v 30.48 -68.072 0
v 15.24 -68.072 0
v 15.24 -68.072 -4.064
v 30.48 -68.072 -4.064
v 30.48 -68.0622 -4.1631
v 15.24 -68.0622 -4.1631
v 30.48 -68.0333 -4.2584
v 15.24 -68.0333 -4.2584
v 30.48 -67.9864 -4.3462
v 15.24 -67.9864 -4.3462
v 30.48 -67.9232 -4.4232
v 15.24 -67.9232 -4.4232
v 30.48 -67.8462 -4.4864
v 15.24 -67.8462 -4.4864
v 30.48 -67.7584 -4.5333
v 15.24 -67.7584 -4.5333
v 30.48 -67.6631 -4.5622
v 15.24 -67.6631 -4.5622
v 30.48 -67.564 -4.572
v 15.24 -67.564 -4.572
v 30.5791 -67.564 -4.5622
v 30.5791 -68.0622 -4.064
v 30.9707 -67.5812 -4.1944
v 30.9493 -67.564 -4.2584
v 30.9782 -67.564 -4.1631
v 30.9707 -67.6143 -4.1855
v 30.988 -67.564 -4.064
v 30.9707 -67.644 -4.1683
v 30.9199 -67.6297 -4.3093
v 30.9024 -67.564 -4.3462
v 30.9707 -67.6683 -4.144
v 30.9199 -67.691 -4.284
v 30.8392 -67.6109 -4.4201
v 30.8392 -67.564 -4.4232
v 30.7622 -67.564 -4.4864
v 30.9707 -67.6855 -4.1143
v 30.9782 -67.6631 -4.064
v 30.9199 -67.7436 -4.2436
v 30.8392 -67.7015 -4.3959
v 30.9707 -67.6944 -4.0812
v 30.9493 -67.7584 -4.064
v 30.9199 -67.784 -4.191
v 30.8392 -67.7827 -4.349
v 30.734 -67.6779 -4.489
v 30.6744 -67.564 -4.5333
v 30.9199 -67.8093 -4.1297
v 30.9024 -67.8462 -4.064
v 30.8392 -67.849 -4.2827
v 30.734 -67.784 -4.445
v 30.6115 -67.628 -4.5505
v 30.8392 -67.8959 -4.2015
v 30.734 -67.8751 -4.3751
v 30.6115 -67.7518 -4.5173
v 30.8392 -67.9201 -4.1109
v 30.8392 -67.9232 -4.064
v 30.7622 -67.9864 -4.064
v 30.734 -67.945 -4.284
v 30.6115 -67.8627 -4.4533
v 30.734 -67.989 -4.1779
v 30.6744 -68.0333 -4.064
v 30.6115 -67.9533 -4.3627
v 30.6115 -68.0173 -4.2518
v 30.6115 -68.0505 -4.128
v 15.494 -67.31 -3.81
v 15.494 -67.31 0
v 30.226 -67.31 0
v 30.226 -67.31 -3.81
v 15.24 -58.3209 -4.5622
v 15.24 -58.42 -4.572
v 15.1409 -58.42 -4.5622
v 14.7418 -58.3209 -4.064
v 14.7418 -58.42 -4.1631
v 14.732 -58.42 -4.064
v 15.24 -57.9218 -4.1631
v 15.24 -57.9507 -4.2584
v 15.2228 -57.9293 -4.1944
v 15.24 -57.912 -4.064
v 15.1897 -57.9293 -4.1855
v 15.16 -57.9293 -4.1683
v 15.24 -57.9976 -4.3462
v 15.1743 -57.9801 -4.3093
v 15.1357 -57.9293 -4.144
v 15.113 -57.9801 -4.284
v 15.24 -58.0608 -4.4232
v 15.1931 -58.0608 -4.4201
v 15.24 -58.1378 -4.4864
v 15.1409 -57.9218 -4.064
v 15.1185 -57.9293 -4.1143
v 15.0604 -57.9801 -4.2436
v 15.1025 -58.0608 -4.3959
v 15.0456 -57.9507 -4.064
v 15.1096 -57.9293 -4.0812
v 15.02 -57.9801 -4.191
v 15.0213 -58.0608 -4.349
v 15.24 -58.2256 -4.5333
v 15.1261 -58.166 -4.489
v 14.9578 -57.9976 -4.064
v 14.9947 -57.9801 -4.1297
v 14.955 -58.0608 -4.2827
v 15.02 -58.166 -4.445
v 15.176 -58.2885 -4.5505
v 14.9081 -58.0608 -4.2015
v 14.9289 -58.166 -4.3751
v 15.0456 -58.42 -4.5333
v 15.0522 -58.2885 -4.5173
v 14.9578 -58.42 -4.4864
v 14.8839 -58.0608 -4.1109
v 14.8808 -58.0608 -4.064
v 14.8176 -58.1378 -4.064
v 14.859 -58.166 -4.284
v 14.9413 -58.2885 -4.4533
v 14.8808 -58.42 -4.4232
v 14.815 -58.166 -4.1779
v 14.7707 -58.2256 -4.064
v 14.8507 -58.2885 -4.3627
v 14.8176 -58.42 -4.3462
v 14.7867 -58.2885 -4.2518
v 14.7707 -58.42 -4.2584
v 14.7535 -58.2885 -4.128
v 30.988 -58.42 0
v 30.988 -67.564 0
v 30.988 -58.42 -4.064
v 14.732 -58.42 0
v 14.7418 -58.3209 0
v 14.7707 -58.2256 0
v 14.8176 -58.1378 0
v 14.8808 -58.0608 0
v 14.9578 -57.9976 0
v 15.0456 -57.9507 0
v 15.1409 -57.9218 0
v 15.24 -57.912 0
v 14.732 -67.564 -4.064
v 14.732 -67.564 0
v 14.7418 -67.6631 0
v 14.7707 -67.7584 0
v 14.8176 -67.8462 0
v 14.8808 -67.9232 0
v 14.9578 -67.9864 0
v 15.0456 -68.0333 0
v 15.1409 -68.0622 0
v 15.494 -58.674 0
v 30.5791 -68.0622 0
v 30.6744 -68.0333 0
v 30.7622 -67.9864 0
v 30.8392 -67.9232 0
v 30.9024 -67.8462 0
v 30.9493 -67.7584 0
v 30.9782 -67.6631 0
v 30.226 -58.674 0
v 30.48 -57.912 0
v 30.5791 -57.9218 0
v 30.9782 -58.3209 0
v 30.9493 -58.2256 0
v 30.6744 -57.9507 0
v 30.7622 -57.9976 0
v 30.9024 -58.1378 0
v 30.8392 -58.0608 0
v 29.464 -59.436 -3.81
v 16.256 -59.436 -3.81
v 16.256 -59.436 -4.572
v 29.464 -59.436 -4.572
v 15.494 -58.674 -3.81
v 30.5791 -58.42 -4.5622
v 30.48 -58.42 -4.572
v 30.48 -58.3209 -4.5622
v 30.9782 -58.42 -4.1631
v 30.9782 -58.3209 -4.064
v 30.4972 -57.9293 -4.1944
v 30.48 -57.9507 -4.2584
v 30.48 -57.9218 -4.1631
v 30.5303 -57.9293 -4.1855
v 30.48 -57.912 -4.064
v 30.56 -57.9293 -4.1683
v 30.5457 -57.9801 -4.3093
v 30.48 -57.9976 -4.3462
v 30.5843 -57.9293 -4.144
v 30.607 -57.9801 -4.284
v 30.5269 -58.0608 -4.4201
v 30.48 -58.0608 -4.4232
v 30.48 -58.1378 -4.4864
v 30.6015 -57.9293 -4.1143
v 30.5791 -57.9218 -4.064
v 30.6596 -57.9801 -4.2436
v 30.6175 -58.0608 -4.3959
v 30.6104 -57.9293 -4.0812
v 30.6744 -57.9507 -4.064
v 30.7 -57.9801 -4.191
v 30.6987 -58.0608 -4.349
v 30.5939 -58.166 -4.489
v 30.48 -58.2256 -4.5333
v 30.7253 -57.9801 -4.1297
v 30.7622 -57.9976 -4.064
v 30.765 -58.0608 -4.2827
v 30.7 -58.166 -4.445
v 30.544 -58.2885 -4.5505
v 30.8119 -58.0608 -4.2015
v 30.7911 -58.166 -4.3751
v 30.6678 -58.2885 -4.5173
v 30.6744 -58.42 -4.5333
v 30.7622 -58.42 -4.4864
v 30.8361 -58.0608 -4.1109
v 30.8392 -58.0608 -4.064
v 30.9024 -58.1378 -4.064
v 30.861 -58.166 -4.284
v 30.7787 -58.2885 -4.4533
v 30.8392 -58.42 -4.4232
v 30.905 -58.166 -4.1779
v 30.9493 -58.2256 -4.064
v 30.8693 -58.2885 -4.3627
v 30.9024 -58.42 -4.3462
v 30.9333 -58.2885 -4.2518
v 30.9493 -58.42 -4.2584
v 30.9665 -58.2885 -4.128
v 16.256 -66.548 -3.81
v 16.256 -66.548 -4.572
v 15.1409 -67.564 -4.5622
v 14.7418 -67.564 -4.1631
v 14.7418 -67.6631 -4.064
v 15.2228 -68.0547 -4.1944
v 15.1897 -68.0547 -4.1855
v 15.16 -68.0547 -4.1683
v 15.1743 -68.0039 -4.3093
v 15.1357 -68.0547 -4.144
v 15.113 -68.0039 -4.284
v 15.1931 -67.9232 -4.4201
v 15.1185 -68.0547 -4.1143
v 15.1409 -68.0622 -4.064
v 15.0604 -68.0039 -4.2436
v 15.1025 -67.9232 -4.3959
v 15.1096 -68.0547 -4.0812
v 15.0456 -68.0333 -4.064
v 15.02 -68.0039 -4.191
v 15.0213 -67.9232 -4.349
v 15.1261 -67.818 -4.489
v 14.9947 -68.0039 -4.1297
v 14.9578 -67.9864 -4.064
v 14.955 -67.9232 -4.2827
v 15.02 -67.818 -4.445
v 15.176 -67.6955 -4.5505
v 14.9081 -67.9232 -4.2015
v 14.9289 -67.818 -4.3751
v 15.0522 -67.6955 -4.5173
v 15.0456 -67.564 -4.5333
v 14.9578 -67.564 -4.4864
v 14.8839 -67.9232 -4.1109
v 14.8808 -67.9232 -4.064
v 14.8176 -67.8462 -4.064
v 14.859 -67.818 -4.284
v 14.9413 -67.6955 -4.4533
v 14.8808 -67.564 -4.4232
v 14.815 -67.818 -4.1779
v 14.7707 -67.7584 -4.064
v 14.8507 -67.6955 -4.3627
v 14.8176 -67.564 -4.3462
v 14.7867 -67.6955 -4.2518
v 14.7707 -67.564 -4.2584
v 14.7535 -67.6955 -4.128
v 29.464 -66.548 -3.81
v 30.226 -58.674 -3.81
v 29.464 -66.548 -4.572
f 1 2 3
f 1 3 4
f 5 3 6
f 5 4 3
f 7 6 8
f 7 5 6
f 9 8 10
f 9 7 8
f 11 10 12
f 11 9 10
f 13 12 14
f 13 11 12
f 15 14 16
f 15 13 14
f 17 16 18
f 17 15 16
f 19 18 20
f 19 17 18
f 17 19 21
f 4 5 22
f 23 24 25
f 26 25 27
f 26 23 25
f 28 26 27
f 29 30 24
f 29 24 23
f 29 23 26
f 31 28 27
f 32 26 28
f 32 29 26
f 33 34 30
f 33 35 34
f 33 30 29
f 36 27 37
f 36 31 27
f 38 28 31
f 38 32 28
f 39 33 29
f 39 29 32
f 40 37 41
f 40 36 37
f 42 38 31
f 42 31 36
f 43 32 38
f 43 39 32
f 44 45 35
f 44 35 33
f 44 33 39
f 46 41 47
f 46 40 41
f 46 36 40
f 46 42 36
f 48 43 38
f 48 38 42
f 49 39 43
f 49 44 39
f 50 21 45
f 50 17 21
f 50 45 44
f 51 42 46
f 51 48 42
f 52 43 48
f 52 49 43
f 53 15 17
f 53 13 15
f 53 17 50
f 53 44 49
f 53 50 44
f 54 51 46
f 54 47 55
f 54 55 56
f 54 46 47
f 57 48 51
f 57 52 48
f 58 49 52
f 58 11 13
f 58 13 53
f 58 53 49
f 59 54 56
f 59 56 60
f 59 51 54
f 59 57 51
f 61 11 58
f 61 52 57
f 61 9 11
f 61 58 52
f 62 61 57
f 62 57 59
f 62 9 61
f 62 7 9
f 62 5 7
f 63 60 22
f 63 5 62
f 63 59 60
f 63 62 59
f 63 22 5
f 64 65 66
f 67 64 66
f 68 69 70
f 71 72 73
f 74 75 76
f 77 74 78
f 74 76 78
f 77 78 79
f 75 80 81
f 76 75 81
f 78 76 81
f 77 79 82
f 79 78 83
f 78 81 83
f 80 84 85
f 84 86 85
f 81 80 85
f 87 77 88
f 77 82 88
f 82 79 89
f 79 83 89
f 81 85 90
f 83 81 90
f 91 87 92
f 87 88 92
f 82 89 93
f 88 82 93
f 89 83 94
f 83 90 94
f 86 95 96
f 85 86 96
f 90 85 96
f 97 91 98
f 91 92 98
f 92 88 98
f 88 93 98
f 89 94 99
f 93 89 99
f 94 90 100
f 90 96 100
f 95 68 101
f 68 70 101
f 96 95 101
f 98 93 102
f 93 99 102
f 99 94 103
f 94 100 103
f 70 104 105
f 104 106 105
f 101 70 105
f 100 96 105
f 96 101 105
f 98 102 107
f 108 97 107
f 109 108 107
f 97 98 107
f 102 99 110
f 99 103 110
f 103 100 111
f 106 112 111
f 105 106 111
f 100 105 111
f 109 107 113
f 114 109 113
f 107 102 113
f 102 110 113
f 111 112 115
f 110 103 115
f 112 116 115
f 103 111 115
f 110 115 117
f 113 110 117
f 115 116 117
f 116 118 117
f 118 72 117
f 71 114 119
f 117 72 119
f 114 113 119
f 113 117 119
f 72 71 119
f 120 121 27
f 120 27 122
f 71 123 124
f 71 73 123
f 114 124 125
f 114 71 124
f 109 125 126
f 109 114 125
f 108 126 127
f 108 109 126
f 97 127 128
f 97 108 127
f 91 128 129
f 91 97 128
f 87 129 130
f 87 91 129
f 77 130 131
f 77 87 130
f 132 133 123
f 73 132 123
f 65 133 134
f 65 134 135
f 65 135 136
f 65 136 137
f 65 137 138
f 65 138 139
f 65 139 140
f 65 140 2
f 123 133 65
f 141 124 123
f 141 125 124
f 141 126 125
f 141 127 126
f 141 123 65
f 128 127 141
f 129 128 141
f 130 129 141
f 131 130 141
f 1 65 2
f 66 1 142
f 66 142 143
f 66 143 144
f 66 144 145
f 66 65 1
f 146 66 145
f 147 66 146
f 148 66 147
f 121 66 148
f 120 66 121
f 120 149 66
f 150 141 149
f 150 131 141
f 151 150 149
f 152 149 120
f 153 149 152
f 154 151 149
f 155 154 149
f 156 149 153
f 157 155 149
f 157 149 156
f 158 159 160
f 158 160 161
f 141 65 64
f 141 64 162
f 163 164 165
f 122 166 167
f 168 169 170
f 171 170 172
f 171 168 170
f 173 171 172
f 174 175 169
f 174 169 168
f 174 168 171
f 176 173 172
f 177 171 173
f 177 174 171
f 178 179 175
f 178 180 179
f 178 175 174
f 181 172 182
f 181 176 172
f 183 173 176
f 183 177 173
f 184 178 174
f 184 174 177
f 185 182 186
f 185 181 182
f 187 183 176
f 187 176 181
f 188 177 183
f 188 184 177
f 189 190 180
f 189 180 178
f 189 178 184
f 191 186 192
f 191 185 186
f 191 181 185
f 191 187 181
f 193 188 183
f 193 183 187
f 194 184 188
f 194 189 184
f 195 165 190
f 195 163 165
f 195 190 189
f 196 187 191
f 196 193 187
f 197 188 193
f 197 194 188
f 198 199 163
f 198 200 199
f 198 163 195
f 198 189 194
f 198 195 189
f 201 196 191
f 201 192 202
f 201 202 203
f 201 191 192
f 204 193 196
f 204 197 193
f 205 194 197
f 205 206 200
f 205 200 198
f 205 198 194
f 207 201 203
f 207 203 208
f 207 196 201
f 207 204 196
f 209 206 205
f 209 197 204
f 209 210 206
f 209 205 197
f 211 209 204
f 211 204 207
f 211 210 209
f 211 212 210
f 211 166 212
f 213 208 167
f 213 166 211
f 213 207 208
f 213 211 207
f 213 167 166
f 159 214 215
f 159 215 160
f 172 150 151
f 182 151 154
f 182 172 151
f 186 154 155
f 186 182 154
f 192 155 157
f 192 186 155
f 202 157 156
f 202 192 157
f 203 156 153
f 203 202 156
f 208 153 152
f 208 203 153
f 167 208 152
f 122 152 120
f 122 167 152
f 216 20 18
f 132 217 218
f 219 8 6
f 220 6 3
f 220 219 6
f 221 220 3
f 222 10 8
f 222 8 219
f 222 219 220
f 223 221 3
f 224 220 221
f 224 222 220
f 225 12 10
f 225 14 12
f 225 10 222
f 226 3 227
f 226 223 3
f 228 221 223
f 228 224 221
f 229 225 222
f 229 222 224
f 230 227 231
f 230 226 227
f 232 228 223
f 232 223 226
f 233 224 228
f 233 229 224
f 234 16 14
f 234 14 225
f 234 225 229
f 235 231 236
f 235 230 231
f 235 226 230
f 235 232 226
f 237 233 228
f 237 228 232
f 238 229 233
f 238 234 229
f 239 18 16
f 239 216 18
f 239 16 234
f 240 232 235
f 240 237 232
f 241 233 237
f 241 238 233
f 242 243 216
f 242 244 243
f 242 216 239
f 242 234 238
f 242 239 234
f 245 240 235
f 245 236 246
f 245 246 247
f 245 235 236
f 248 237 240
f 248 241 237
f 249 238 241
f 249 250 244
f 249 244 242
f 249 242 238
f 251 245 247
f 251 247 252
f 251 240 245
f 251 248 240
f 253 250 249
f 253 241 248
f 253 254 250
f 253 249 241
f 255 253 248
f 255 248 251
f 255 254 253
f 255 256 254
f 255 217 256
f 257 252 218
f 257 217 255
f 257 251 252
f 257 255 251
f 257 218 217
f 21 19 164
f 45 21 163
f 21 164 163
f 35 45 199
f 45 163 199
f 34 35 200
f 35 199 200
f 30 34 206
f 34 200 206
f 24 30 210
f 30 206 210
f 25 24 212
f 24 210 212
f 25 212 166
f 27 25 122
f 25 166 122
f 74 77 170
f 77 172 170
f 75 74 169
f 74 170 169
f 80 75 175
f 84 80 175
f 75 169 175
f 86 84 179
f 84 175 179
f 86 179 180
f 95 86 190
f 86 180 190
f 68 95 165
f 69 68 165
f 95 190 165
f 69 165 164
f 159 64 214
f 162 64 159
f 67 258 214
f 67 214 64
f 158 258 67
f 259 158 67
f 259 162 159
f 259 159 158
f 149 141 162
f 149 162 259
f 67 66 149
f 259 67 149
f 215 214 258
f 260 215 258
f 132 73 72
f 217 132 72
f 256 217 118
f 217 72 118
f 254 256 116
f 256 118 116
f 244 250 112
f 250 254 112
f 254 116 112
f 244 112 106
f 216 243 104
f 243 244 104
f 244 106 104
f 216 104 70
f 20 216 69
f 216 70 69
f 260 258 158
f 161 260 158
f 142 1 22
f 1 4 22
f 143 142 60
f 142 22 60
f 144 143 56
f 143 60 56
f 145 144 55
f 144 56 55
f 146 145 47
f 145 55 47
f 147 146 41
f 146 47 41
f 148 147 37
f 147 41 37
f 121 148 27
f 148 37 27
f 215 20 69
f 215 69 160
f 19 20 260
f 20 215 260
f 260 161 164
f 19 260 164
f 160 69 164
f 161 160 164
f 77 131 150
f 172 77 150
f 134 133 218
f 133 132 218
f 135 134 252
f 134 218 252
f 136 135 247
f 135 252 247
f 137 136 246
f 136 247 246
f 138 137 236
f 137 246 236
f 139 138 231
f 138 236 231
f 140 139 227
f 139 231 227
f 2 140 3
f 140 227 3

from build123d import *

# Parameters (mm, degrees)
SKETCH1_W           = 16.256
SKETCH1_H           = 10.16
SKETCH1_W_2         = 13.208
SKETCH1_H_2         = 7.112
BOSS_EXTRUDE1_DEPTH = 4.572
SKETCH2_W           = 14.732
SKETCH2_H           = 8.636
CUT_EXTRUDE1_DEPTH  = 3.81
FILLET1_R           = 0.508


with BuildPart() as part:
    # Sketch1 → Boss-Extrude1 (new body)
    with BuildSketch(Plane.XY):
        with Locations((22.86, -62.992)):
            Rectangle(SKETCH1_W, SKETCH1_H)
        with Locations((22.86, -62.992)):
            Rectangle(SKETCH1_W_2, SKETCH1_H_2, mode=Mode.SUBTRACT)
    extrude(amount=-BOSS_EXTRUDE1_DEPTH)

    # Sketch2 → Cut-Extrude1 (cut)
    with BuildSketch(Plane.XY):
        with Locations((22.86, -62.992)):
            Rectangle(SKETCH2_W, SKETCH2_H)
    extrude(amount=-CUT_EXTRUDE1_DEPTH, mode=Mode.SUBTRACT)

    # Fillet1
    fillet1_edges = [part.edges().sort_by_distance(p)[0] for p in [
        (14.732, -62.992, -4.572),
        (22.86, -68.072, -4.572),
        (30.988, -62.992, -4.572),
        (22.86, -57.912, -4.572),
        (30.988, -68.072, -2.286),
        (14.732, -68.072, -2.286),
        (14.732, -57.912, -2.286),
        (30.988, -57.912, -2.286),
    ]]
    fillet(fillet1_edges, radius=FILLET1_R)


solid = part.part
